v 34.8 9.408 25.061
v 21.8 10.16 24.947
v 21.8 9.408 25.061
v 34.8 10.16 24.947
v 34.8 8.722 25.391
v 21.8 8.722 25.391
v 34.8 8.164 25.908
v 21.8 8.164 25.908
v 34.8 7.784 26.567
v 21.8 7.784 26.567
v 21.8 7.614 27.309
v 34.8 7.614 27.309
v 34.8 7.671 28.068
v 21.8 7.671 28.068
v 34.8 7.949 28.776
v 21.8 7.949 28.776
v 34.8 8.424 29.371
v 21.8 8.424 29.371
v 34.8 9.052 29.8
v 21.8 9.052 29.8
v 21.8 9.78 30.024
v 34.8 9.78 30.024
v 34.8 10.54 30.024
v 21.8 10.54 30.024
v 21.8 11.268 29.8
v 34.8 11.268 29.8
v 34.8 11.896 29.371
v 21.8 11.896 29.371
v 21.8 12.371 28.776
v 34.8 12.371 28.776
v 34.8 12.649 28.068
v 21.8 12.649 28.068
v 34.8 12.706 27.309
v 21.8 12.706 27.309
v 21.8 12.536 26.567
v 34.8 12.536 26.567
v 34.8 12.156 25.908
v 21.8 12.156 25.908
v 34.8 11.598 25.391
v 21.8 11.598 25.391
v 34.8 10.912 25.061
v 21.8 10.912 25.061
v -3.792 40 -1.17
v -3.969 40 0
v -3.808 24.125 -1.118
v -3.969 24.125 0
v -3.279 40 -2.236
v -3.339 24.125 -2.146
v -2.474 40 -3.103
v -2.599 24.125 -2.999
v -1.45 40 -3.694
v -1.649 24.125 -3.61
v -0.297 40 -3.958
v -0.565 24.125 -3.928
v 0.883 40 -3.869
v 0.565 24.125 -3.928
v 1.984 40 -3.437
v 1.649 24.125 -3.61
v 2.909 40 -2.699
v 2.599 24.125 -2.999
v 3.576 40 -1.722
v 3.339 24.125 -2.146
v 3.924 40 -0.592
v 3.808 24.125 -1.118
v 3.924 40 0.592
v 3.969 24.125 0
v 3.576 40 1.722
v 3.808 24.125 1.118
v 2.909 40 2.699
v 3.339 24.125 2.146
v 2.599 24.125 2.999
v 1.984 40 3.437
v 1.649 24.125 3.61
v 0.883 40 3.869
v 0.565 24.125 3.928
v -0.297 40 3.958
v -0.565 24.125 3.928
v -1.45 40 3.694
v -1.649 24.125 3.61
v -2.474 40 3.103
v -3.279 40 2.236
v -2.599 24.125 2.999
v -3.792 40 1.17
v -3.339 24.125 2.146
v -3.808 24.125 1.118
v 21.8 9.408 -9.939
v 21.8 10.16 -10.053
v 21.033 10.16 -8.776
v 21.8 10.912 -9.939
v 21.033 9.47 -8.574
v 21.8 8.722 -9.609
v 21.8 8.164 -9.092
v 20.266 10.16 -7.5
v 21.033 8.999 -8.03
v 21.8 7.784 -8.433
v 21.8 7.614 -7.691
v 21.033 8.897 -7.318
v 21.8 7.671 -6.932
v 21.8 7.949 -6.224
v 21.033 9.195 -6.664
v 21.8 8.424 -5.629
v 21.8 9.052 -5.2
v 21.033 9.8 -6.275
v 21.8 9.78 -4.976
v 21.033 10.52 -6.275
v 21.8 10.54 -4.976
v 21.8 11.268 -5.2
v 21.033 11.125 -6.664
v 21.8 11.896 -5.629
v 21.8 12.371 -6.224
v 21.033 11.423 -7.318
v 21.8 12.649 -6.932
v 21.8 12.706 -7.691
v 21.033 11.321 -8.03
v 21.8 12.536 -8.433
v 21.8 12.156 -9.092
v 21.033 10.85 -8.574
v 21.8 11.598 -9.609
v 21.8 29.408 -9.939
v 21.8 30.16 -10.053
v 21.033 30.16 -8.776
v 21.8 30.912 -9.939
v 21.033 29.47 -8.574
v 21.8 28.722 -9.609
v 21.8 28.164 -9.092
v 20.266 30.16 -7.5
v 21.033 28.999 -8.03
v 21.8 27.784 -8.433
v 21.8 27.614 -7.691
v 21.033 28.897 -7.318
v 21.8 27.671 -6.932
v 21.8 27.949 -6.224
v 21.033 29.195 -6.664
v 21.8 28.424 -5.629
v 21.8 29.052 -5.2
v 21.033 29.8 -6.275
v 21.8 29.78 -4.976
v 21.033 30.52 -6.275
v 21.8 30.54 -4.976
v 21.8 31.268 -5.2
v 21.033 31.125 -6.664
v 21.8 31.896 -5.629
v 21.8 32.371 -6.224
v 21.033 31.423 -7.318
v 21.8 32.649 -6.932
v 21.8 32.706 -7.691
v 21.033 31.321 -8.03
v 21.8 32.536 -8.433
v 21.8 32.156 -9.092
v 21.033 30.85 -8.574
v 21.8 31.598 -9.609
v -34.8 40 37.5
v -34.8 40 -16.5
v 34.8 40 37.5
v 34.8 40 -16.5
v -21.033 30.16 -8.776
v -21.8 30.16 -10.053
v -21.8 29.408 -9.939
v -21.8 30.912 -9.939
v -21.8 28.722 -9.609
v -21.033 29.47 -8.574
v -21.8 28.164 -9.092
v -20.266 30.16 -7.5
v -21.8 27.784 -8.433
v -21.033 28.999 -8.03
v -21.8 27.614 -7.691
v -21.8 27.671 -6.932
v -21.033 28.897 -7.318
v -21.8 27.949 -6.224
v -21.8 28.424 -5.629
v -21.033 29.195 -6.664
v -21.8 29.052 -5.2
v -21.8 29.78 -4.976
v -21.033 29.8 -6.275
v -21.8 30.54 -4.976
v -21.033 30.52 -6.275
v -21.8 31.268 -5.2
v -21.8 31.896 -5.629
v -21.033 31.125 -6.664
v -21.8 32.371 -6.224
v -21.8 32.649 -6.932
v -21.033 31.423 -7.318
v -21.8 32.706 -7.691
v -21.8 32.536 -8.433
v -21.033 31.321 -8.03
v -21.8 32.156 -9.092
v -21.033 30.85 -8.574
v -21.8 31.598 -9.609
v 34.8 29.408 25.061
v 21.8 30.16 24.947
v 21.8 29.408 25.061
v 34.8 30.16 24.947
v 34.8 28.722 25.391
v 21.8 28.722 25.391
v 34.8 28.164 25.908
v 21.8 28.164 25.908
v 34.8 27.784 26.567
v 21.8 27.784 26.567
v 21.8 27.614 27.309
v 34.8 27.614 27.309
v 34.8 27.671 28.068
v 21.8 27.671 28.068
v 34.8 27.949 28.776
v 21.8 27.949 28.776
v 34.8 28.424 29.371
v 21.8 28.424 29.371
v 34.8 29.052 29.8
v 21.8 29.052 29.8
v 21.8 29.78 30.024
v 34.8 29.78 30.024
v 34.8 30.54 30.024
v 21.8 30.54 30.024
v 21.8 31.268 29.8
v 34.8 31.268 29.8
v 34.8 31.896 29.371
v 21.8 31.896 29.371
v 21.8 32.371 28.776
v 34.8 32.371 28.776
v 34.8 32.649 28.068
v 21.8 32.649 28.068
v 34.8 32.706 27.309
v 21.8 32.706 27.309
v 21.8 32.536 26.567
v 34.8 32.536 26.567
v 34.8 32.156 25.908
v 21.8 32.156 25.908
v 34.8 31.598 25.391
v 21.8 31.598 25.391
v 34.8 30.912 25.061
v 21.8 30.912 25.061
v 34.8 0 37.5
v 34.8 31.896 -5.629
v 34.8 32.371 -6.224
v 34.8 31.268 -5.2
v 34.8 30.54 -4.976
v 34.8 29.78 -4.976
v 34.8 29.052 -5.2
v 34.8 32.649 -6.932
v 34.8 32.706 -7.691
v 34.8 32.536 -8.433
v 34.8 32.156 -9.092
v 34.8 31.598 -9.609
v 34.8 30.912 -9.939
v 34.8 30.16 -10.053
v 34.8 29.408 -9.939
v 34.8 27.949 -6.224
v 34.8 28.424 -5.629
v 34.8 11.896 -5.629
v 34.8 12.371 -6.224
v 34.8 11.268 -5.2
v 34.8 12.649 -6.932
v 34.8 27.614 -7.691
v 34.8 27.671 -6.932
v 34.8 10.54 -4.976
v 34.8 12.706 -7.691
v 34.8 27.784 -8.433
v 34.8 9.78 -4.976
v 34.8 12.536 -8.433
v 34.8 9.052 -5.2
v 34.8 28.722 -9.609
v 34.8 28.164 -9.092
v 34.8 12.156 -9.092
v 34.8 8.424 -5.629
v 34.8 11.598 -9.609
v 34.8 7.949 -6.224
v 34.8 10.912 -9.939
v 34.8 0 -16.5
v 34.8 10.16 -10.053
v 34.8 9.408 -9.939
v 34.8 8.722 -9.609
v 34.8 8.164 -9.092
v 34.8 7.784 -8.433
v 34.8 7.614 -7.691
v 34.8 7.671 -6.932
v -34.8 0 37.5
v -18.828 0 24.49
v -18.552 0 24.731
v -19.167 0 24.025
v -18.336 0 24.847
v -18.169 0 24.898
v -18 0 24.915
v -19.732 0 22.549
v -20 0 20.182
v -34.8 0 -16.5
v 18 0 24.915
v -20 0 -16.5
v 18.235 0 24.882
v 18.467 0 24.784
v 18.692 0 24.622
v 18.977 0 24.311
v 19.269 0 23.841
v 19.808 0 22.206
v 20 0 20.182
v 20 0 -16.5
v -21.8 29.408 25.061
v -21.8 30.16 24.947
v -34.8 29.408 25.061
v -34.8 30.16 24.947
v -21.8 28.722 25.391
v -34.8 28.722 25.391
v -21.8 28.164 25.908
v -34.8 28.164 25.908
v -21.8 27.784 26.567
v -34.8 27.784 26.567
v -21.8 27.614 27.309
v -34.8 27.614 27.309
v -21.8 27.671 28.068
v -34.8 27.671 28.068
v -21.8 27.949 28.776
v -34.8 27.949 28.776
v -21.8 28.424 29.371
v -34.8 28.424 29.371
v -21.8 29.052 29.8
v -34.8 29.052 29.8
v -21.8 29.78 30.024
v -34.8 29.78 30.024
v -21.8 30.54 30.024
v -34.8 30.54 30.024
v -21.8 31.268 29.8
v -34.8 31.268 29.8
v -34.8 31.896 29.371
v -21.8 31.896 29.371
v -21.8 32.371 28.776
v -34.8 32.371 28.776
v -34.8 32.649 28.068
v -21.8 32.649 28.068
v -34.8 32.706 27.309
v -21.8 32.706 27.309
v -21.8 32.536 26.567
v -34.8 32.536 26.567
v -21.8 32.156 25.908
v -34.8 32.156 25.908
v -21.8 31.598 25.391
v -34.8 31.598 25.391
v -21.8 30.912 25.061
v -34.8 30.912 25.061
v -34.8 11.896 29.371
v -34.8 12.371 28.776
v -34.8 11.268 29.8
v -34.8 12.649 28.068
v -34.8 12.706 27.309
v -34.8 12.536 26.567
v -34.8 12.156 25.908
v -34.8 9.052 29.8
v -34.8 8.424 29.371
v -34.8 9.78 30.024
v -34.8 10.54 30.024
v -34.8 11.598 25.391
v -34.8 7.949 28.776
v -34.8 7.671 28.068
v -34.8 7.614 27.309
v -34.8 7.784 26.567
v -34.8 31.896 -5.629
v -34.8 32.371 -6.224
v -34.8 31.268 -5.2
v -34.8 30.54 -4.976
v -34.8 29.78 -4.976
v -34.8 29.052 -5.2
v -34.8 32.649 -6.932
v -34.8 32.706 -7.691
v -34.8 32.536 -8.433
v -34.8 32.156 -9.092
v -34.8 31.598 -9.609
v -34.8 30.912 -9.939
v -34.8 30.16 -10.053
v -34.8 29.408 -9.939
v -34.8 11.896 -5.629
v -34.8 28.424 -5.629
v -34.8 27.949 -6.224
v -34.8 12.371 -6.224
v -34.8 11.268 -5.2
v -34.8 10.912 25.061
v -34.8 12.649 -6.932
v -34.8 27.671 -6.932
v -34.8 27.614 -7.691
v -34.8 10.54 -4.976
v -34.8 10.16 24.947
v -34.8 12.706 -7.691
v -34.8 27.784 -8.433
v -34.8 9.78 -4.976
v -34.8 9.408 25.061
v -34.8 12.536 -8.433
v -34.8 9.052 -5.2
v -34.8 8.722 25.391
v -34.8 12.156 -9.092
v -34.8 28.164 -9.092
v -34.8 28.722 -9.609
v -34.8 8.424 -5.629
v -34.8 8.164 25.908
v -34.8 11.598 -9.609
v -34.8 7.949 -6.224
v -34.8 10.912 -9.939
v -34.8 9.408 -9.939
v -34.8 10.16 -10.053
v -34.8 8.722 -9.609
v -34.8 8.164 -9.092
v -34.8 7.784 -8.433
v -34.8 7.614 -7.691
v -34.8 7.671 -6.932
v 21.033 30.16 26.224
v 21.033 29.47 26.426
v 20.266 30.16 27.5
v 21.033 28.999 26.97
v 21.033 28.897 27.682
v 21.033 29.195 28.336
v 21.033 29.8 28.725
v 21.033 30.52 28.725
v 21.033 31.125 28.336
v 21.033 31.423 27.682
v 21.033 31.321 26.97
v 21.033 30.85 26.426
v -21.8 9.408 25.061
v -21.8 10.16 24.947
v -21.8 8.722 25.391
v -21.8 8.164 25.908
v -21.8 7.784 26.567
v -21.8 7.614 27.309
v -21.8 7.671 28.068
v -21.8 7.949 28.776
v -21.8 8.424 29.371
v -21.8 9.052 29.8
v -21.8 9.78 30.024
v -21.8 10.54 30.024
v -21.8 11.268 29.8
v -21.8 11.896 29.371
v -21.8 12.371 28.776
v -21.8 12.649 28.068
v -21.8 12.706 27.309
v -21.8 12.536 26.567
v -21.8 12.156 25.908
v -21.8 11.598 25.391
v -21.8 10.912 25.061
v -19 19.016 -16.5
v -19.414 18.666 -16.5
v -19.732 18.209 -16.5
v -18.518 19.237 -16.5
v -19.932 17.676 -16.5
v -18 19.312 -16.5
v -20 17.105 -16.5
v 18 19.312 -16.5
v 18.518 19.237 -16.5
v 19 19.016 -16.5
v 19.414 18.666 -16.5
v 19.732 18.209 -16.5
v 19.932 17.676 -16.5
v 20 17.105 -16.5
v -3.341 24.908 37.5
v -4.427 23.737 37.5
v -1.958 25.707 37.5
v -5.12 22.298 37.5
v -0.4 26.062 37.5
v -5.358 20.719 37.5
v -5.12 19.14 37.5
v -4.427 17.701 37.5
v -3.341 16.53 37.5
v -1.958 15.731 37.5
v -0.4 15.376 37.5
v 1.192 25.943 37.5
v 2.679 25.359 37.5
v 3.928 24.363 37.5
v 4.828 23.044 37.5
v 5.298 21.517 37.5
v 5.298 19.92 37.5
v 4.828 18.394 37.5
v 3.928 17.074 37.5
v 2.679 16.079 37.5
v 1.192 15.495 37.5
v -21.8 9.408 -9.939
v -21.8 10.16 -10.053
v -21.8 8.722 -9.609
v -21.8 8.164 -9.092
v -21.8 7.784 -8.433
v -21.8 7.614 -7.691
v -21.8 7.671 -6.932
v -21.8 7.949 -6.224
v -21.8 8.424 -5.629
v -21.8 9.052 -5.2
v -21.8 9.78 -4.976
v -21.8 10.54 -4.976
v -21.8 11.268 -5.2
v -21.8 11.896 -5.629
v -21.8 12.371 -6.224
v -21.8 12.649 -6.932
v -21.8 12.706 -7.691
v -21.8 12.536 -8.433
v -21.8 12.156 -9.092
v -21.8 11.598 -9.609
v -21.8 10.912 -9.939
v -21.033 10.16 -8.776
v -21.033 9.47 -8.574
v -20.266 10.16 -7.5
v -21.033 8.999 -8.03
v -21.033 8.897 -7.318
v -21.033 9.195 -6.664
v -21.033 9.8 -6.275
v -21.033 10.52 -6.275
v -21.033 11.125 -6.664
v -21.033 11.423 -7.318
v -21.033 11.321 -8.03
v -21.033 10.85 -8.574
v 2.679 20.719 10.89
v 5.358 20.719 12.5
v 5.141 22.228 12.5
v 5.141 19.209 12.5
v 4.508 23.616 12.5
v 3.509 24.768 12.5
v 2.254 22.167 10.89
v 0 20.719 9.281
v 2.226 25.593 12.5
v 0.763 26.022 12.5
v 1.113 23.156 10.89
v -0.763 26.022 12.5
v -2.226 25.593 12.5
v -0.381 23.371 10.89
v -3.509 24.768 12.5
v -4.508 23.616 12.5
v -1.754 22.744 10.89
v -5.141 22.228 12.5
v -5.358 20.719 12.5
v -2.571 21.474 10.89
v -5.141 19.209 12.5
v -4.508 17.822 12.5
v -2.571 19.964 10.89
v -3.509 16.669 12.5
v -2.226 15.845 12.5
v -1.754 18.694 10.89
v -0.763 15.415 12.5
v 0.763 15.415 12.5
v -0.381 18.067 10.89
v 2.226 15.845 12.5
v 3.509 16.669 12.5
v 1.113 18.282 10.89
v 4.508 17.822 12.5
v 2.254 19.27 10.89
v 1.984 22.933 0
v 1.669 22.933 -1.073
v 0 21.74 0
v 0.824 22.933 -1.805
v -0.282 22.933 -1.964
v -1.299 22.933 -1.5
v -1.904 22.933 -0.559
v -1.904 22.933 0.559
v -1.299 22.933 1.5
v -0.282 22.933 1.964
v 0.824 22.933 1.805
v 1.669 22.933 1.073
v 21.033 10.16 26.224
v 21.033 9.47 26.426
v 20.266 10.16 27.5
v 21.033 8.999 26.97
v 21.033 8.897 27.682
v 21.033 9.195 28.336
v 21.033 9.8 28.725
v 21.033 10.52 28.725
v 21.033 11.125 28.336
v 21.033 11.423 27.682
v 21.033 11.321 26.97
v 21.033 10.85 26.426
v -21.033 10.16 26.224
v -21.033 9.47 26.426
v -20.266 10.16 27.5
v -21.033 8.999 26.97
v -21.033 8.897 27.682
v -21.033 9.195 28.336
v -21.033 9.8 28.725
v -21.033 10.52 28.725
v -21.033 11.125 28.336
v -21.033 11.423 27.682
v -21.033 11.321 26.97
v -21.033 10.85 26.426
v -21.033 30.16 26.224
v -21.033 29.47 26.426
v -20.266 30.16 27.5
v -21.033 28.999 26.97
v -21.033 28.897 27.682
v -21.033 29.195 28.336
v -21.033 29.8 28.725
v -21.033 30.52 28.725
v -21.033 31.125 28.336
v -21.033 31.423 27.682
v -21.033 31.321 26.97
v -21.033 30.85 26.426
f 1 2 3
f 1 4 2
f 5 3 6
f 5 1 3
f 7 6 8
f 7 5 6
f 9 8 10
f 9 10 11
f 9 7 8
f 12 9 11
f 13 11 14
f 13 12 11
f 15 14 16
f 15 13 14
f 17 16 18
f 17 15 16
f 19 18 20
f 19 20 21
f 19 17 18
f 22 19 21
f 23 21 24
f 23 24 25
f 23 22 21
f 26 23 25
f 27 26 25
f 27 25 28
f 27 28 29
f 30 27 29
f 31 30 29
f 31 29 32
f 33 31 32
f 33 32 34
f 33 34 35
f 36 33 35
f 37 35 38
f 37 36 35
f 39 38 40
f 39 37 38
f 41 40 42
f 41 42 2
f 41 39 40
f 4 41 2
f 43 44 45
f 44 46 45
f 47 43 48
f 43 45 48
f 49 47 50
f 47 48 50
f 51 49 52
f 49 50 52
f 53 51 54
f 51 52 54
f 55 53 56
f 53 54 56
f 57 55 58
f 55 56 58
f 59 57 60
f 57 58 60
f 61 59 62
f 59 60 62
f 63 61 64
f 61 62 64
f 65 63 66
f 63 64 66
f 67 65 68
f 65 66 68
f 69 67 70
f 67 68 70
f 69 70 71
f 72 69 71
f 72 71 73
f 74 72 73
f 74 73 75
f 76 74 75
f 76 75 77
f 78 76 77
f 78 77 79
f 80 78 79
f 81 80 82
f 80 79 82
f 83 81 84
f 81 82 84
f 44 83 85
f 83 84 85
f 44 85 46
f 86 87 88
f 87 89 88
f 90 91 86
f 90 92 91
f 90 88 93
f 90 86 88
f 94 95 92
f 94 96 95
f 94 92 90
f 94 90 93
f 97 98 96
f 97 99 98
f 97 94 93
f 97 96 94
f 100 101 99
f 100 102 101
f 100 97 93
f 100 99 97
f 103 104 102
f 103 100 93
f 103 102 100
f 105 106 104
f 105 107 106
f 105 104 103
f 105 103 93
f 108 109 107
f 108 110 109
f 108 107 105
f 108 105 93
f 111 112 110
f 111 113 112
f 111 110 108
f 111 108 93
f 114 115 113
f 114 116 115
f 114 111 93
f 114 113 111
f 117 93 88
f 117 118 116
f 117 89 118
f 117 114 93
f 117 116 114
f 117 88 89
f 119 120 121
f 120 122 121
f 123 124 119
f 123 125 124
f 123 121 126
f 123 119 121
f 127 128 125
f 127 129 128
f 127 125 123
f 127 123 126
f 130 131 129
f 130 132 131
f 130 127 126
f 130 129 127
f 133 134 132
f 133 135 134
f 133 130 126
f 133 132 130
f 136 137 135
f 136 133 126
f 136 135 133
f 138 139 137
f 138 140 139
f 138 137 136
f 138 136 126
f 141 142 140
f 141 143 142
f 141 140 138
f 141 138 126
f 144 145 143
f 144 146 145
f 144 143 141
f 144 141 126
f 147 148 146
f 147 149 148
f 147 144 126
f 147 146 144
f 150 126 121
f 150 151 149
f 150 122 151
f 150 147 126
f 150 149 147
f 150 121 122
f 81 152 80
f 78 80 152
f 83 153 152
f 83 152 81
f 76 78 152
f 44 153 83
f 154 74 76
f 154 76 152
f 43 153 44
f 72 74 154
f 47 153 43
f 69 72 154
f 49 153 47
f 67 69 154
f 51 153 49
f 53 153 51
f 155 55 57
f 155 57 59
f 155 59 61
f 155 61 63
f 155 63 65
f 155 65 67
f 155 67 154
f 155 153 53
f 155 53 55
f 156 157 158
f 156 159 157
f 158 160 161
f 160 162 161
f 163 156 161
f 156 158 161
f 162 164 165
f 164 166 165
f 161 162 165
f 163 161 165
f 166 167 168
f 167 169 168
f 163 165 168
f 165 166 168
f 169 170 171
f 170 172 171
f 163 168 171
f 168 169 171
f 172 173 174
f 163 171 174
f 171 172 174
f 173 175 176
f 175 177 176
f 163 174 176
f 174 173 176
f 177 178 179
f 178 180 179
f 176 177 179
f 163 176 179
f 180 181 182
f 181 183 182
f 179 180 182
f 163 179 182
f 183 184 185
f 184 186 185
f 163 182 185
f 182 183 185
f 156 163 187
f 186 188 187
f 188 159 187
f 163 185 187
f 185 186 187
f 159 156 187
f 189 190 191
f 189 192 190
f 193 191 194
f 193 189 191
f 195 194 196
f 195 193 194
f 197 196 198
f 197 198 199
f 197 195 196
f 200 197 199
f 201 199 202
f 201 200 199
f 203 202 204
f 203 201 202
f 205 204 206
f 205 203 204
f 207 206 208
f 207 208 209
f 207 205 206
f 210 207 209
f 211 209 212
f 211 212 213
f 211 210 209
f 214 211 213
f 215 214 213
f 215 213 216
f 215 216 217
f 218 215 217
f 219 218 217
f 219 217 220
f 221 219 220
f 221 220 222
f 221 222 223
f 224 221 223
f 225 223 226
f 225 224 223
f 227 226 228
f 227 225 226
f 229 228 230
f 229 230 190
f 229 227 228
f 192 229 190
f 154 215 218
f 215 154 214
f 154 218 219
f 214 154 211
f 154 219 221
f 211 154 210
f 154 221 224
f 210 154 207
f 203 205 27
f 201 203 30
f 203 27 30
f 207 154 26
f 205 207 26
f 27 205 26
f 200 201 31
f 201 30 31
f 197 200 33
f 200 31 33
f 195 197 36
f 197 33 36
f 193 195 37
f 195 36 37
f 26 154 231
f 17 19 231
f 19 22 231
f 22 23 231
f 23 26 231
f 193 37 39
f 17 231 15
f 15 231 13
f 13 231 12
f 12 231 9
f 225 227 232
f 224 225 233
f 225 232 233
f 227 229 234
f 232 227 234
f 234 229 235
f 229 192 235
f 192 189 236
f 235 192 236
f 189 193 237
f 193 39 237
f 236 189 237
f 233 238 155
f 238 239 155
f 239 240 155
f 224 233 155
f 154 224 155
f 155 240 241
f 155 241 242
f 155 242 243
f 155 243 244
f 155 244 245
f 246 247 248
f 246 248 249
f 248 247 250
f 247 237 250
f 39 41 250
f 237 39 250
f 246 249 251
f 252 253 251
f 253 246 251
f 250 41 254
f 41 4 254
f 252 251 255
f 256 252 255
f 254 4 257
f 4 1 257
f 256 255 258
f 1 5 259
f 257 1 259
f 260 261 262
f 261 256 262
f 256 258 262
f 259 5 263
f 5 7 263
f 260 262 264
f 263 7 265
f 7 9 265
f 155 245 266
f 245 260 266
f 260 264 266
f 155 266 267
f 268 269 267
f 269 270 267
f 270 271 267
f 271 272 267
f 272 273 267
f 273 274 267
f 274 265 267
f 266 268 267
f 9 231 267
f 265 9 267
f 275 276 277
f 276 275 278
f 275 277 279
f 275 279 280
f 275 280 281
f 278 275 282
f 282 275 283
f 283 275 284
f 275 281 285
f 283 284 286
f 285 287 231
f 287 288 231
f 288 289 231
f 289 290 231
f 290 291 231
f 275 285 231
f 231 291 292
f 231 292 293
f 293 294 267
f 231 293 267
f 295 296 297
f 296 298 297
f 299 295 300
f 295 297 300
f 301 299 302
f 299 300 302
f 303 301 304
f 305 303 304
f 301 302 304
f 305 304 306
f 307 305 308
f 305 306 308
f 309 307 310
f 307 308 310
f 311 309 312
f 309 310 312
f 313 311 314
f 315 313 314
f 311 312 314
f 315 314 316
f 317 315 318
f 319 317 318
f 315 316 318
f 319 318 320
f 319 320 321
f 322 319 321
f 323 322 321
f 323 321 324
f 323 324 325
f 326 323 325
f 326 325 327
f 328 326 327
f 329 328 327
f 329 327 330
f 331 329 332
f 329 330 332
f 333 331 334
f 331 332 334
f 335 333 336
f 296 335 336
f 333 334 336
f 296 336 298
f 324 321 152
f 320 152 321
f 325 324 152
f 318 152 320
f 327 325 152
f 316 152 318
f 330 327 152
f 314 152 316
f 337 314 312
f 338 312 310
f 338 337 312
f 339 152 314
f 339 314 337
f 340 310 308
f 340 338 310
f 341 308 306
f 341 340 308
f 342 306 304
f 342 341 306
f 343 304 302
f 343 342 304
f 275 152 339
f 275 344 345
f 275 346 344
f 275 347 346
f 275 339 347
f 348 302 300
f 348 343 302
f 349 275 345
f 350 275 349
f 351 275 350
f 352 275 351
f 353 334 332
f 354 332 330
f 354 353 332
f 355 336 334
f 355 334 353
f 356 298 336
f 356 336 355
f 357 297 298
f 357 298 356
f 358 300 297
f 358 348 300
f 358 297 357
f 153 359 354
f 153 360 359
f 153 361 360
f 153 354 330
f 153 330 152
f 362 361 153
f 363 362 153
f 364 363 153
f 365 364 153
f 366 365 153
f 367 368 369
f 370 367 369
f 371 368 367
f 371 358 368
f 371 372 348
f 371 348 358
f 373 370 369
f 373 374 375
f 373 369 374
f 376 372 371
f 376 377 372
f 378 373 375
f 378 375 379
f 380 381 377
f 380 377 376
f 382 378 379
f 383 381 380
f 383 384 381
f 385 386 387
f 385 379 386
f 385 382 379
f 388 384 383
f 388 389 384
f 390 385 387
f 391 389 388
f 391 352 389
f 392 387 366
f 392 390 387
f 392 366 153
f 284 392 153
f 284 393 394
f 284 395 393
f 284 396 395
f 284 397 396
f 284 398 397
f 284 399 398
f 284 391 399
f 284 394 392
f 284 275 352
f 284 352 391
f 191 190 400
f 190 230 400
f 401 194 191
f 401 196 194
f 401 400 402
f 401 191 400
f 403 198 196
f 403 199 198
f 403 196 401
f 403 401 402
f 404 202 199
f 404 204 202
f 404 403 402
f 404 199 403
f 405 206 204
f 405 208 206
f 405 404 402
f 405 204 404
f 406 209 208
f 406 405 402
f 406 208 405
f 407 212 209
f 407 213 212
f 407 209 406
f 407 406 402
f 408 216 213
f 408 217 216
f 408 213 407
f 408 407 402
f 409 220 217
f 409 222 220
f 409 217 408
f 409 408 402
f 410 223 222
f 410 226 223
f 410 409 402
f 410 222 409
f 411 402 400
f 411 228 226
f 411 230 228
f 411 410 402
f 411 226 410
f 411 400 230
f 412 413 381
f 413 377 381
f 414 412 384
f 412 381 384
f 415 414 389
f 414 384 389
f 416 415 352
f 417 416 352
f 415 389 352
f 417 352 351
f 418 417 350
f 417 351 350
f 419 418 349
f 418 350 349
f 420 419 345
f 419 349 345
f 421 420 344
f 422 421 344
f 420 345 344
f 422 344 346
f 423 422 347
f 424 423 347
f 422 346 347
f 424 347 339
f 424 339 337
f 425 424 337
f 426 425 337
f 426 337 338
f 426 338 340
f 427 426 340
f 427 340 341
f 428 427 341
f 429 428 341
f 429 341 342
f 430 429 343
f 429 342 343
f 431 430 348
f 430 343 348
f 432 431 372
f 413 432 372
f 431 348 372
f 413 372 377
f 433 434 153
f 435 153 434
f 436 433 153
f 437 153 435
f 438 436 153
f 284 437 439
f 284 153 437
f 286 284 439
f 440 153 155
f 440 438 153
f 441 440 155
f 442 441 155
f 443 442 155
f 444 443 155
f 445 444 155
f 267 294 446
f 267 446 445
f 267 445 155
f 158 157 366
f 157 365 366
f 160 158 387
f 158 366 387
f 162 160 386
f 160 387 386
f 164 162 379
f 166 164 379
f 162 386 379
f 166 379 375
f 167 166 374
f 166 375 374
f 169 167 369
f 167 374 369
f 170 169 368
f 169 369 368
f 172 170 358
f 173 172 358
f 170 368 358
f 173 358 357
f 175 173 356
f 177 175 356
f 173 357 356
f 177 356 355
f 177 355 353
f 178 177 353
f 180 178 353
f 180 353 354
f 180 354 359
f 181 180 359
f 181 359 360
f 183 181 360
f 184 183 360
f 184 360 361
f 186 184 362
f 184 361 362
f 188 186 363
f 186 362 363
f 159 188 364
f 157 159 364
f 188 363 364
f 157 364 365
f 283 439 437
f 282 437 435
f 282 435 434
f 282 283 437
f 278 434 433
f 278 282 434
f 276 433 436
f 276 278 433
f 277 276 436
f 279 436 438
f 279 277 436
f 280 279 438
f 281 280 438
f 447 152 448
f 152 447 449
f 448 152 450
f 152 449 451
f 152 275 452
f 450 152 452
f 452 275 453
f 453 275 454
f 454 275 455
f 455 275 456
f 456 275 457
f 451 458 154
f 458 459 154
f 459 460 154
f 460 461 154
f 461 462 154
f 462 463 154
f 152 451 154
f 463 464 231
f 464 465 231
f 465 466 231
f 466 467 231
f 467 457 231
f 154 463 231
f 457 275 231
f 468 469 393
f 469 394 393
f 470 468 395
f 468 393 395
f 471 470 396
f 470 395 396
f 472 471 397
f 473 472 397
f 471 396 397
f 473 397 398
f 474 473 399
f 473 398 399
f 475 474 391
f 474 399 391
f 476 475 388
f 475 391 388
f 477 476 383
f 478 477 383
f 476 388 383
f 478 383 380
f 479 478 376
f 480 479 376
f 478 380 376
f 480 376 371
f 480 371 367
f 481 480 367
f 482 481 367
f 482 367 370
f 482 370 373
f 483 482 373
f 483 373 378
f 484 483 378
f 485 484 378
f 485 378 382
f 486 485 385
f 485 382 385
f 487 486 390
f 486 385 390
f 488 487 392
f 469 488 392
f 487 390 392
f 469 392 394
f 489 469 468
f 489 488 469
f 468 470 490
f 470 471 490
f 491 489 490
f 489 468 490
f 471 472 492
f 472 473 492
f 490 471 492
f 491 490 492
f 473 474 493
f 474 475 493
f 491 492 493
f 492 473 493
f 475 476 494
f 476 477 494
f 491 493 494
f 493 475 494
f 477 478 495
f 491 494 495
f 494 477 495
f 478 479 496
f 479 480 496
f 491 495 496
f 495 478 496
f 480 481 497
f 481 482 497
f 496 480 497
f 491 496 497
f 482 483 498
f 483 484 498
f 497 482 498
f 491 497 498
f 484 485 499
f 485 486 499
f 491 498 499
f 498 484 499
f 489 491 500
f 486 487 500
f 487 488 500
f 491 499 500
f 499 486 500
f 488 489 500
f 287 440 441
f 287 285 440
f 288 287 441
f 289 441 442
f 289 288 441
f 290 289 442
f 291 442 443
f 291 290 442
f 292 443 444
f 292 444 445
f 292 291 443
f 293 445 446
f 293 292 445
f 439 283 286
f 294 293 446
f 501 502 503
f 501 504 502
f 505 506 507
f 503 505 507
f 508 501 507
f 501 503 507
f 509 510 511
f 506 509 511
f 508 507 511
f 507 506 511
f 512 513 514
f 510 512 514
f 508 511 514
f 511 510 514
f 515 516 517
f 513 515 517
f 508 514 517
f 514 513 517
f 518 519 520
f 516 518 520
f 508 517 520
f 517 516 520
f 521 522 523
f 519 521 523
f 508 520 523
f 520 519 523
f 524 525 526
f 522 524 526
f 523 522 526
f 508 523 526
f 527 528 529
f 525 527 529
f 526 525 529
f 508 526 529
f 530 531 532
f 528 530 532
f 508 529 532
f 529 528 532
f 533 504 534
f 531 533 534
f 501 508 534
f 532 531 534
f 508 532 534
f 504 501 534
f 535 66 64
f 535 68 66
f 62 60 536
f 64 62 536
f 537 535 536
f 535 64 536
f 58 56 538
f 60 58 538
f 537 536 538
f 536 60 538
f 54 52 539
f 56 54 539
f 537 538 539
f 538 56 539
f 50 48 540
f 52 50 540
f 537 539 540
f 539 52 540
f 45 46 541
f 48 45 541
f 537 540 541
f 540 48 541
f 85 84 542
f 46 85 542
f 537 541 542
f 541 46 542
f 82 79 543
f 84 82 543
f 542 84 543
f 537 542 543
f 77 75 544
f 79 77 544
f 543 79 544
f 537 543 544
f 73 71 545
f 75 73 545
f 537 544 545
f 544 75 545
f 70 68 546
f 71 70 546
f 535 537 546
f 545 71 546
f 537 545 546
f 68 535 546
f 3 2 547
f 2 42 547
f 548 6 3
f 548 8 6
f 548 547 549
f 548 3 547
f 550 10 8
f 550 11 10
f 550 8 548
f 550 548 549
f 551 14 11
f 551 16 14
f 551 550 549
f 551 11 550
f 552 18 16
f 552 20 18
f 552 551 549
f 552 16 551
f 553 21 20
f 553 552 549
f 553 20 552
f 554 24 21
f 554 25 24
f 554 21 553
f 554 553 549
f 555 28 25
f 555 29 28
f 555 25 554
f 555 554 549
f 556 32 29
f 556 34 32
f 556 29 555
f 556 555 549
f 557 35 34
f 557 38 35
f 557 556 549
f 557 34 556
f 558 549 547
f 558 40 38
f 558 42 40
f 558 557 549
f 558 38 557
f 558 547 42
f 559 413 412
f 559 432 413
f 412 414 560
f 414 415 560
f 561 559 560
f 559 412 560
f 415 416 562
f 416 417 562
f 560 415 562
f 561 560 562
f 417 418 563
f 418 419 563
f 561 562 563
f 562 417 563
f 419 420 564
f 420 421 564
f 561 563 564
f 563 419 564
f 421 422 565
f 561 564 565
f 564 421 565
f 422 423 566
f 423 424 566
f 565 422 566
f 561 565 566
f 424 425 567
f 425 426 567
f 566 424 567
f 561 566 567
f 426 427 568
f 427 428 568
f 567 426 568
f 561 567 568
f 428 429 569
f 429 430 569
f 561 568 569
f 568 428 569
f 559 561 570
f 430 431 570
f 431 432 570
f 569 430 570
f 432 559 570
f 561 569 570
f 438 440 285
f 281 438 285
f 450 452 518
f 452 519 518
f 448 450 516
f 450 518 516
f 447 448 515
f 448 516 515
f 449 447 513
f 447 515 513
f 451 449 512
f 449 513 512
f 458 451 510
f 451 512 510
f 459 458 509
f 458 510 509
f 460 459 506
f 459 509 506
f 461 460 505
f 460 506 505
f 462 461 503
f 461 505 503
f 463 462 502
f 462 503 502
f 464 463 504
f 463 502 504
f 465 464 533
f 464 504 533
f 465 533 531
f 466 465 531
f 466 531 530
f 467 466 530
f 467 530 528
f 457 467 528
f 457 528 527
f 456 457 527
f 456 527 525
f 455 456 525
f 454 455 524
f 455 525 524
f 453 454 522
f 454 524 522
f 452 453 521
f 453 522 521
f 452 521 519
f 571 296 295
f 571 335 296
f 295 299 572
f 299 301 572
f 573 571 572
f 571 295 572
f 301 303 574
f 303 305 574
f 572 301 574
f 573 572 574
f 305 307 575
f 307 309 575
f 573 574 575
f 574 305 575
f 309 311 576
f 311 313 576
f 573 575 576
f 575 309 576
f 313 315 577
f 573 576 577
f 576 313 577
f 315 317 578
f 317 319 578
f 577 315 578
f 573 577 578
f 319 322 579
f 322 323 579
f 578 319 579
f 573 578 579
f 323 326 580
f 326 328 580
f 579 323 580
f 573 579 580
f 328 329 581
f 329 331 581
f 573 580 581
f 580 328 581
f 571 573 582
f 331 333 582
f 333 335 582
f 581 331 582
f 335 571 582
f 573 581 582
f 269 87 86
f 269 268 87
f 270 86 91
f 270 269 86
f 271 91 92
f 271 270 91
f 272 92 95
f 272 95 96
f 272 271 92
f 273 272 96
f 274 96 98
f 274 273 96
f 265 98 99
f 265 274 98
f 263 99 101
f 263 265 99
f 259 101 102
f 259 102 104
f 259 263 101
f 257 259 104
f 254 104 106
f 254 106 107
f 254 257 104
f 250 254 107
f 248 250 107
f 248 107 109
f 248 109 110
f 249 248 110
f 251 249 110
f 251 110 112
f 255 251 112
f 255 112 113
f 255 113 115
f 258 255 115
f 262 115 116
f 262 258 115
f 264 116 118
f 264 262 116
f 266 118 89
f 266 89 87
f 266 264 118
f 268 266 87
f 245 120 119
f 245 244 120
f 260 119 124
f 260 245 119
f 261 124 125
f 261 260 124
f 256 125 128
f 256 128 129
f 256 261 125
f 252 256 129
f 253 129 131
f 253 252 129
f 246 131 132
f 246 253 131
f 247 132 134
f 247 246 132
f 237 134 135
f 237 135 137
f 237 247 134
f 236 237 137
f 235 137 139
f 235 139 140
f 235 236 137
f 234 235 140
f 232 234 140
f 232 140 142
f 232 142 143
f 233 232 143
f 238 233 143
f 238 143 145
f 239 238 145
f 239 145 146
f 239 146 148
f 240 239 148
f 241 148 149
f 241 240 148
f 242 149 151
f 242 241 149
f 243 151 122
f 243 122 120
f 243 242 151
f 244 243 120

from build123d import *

# Parameters (mm, degrees)
SKETCH1_W                        = 69.6
SKETCH1_H                        = 75
BOSS_EXTRUDE1_DEPTH              = 40
SKETCH3_W                        = 126.991899018
SKETCH3_H                        = 42.64725952
CUT_EXTRUDE2_DEPTH               = 41
F_3_8_16_TAPPED_HOLE1_D          = 7.9375
F_3_8_16_TAPPED_HOLE1_DEPTH      = 15.875
F_3_8_16_TAPPED_HOLE1_TIP        = 2.384665582
F_1_4_20_TAPPED_HOLE1_AT_2_COUNT = 2
F_1_4_20_TAPPED_HOLE1_AT_2_PITCH = 20
F_1_4_20_TAPPED_HOLE1_AT_3_COUNT = 2
F_1_4_20_TAPPED_HOLE1_AT_3_PITCH = 40.311288741
F_1_4_20_TAPPED_HOLE1_AT_4_COUNT = 2
F_1_4_20_TAPPED_HOLE1_AT_4_PITCH = 35
CUT_EXTRUDE3_DEPTH               = 20
F_1_2_13_TAPPED_HOLE1_D          = 10.71626
F_1_2_13_TAPPED_HOLE1_DEPTH      = 25
F_1_2_13_TAPPED_HOLE1_TIP        = 3.219489309
FILLET1_R                        = 2


with BuildPart() as part:
    # Sketch1 → Boss-Extrude1 (new body)
    with BuildSketch(Plane(origin=(0, 0, 0), x_dir=(1, 0, 0), z_dir=(0, 1, 0))):
        Rectangle(SKETCH1_W, SKETCH1_H)
    extrude(amount=BOSS_EXTRUDE1_DEPTH)

    # Sketch3 → Cut-Extrude2 (cut, through all)
    with BuildSketch(Plane(origin=(0, 0, 0), x_dir=(1, 0, 0), z_dir=(0, 1, 0))):
        with Locations((-9.204742755, 37.82362976)):
            Rectangle(SKETCH3_W, SKETCH3_H)
    extrude(amount=CUT_EXTRUDE2_DEPTH, mode=Mode.SUBTRACT)

    # 3/8-16 Tapped Hole1
    with Locations(Plane(origin=(0, 40, 0), x_dir=(1, 0, 0), z_dir=(0, 1, 0))):
        with Locations((0, 0)):
            Hole(F_3_8_16_TAPPED_HOLE1_D / 2, depth=F_3_8_16_TAPPED_HOLE1_DEPTH)
            with Locations((0, 0, -(F_3_8_16_TAPPED_HOLE1_DEPTH + F_3_8_16_TAPPED_HOLE1_TIP / 2))):  # 118° drill point
                Cone(0, F_3_8_16_TAPPED_HOLE1_D / 2, F_3_8_16_TAPPED_HOLE1_TIP, mode=Mode.SUBTRACT)

    # Sketch10 → 1/4-20 Tapped Hole1 (revolve, cut)
    with BuildSketch(Plane(origin=(34.8, 30.16, -7.5), x_dir=(0, 0, -1), z_dir=(0, 1, 0))):
        Polygon((0, 0), (0, 14.533816902), (2.5527, 13), (2.5527, 0), align=None)
    f_1_4_20_tapped_hole1 = revolve(axis=Axis((41.15, 30.16, -7.5), (-1, 0, 0)), mode=Mode.SUBTRACT)

    # 1/4-20 Tapped Hole1 at 2: 1/4-20 Tapped Hole1 ×2
    with Locations(*[(0, -i * F_1_4_20_TAPPED_HOLE1_AT_2_PITCH, 0) for i in range(1, F_1_4_20_TAPPED_HOLE1_AT_2_COUNT)]):
        add(f_1_4_20_tapped_hole1, mode=Mode.SUBTRACT)

    # 1/4-20 Tapped Hole1 at 3: 1/4-20 Tapped Hole1 ×2
    with Locations(*[Vector(0, -0.496138938, 0.868243142) * (i * F_1_4_20_TAPPED_HOLE1_AT_3_PITCH) for i in range(1, F_1_4_20_TAPPED_HOLE1_AT_3_COUNT)]):
        add(f_1_4_20_tapped_hole1, mode=Mode.SUBTRACT)

    # 1/4-20 Tapped Hole1 at 4: 1/4-20 Tapped Hole1 ×2
    with Locations(*[(0, 0, i * F_1_4_20_TAPPED_HOLE1_AT_4_PITCH) for i in range(1, F_1_4_20_TAPPED_HOLE1_AT_4_COUNT)]):
        add(f_1_4_20_tapped_hole1, mode=Mode.SUBTRACT)

    # Mirror1: 1/4-20 Tapped Hole1 across plane
    add(f_1_4_20_tapped_hole1.mirror(Plane(origin=(0, 0, 0), x_dir=(0, 0, 1), z_dir=(1, 0, 0))), mode=Mode.SUBTRACT)

    # Mirror1 copy 1 sketch → Mirror1 copy 1 (revolve, cut)
    with BuildSketch(Plane(origin=(-34.8, 10.16, -7.5), x_dir=(0, 0, -1), z_dir=(0, 1, 0))):
        Polygon((0, 0), (0, -14.533816902), (2.5527, -13), (2.5527, 0), align=None)
    revolve(axis=Axis((-41.15, 10.16, -7.5), (-1, 0, 0)), mode=Mode.SUBTRACT)

    # Mirror1 copy 2 sketch → Mirror1 copy 2 (revolve, cut)
    with BuildSketch(Plane(origin=(-34.8, 10.16, 27.5), x_dir=(0, 0, -1), z_dir=(0, 1, 0))):
        Polygon((0, 0), (0, -14.533816902), (2.5527, -13), (2.5527, 0), align=None)
    revolve(axis=Axis((-41.15, 10.16, 27.5), (-1, 0, 0)), mode=Mode.SUBTRACT)

    # Mirror1 copy 3 sketch → Mirror1 copy 3 (revolve, cut)
    with BuildSketch(Plane(origin=(-34.8, 30.16, 27.5), x_dir=(0, 0, -1), z_dir=(0, 1, 0))):
        Polygon((0, 0), (0, -14.533816902), (2.5527, -13), (2.5527, 0), align=None)
    revolve(axis=Axis((-41.15, 30.16, 27.5), (-1, 0, 0)), mode=Mode.SUBTRACT)

    # Sketch11 → Cut-Extrude3 (cut, symmetric)
    with BuildSketch(Plane(origin=(0, 0, 0), x_dir=(0, 0, -1), z_dir=(1, 0, 0))):
        Polygon((20.112673013, 20.996619633), (-33.5, -4.003380367), (20.112673013, -4.003380367), align=None)
    extrude(amount=CUT_EXTRUDE3_DEPTH, both=True, mode=Mode.SUBTRACT)

    # 1/2-13 Tapped Hole1
    with Locations(Plane.XY.offset(37.5)):
        with Locations((0, 20.718863156)):
            Hole(F_1_2_13_TAPPED_HOLE1_D / 2, depth=F_1_2_13_TAPPED_HOLE1_DEPTH)
            with Locations((0, 0, -(F_1_2_13_TAPPED_HOLE1_DEPTH + F_1_2_13_TAPPED_HOLE1_TIP / 2))):  # 118° drill point
                Cone(0, F_1_2_13_TAPPED_HOLE1_D / 2, F_1_2_13_TAPPED_HOLE1_TIP, mode=Mode.SUBTRACT)

    # Fillet1
    fillet1_edges = [part.edges().sort_by_distance(p)[0] for p in [
        (-20, 9.65600127, 4.207361549),
        (20, 9.65600127, 4.207361549),
    ]]
    fillet(fillet1_edges, radius=FILLET1_R)


solid = part.part
